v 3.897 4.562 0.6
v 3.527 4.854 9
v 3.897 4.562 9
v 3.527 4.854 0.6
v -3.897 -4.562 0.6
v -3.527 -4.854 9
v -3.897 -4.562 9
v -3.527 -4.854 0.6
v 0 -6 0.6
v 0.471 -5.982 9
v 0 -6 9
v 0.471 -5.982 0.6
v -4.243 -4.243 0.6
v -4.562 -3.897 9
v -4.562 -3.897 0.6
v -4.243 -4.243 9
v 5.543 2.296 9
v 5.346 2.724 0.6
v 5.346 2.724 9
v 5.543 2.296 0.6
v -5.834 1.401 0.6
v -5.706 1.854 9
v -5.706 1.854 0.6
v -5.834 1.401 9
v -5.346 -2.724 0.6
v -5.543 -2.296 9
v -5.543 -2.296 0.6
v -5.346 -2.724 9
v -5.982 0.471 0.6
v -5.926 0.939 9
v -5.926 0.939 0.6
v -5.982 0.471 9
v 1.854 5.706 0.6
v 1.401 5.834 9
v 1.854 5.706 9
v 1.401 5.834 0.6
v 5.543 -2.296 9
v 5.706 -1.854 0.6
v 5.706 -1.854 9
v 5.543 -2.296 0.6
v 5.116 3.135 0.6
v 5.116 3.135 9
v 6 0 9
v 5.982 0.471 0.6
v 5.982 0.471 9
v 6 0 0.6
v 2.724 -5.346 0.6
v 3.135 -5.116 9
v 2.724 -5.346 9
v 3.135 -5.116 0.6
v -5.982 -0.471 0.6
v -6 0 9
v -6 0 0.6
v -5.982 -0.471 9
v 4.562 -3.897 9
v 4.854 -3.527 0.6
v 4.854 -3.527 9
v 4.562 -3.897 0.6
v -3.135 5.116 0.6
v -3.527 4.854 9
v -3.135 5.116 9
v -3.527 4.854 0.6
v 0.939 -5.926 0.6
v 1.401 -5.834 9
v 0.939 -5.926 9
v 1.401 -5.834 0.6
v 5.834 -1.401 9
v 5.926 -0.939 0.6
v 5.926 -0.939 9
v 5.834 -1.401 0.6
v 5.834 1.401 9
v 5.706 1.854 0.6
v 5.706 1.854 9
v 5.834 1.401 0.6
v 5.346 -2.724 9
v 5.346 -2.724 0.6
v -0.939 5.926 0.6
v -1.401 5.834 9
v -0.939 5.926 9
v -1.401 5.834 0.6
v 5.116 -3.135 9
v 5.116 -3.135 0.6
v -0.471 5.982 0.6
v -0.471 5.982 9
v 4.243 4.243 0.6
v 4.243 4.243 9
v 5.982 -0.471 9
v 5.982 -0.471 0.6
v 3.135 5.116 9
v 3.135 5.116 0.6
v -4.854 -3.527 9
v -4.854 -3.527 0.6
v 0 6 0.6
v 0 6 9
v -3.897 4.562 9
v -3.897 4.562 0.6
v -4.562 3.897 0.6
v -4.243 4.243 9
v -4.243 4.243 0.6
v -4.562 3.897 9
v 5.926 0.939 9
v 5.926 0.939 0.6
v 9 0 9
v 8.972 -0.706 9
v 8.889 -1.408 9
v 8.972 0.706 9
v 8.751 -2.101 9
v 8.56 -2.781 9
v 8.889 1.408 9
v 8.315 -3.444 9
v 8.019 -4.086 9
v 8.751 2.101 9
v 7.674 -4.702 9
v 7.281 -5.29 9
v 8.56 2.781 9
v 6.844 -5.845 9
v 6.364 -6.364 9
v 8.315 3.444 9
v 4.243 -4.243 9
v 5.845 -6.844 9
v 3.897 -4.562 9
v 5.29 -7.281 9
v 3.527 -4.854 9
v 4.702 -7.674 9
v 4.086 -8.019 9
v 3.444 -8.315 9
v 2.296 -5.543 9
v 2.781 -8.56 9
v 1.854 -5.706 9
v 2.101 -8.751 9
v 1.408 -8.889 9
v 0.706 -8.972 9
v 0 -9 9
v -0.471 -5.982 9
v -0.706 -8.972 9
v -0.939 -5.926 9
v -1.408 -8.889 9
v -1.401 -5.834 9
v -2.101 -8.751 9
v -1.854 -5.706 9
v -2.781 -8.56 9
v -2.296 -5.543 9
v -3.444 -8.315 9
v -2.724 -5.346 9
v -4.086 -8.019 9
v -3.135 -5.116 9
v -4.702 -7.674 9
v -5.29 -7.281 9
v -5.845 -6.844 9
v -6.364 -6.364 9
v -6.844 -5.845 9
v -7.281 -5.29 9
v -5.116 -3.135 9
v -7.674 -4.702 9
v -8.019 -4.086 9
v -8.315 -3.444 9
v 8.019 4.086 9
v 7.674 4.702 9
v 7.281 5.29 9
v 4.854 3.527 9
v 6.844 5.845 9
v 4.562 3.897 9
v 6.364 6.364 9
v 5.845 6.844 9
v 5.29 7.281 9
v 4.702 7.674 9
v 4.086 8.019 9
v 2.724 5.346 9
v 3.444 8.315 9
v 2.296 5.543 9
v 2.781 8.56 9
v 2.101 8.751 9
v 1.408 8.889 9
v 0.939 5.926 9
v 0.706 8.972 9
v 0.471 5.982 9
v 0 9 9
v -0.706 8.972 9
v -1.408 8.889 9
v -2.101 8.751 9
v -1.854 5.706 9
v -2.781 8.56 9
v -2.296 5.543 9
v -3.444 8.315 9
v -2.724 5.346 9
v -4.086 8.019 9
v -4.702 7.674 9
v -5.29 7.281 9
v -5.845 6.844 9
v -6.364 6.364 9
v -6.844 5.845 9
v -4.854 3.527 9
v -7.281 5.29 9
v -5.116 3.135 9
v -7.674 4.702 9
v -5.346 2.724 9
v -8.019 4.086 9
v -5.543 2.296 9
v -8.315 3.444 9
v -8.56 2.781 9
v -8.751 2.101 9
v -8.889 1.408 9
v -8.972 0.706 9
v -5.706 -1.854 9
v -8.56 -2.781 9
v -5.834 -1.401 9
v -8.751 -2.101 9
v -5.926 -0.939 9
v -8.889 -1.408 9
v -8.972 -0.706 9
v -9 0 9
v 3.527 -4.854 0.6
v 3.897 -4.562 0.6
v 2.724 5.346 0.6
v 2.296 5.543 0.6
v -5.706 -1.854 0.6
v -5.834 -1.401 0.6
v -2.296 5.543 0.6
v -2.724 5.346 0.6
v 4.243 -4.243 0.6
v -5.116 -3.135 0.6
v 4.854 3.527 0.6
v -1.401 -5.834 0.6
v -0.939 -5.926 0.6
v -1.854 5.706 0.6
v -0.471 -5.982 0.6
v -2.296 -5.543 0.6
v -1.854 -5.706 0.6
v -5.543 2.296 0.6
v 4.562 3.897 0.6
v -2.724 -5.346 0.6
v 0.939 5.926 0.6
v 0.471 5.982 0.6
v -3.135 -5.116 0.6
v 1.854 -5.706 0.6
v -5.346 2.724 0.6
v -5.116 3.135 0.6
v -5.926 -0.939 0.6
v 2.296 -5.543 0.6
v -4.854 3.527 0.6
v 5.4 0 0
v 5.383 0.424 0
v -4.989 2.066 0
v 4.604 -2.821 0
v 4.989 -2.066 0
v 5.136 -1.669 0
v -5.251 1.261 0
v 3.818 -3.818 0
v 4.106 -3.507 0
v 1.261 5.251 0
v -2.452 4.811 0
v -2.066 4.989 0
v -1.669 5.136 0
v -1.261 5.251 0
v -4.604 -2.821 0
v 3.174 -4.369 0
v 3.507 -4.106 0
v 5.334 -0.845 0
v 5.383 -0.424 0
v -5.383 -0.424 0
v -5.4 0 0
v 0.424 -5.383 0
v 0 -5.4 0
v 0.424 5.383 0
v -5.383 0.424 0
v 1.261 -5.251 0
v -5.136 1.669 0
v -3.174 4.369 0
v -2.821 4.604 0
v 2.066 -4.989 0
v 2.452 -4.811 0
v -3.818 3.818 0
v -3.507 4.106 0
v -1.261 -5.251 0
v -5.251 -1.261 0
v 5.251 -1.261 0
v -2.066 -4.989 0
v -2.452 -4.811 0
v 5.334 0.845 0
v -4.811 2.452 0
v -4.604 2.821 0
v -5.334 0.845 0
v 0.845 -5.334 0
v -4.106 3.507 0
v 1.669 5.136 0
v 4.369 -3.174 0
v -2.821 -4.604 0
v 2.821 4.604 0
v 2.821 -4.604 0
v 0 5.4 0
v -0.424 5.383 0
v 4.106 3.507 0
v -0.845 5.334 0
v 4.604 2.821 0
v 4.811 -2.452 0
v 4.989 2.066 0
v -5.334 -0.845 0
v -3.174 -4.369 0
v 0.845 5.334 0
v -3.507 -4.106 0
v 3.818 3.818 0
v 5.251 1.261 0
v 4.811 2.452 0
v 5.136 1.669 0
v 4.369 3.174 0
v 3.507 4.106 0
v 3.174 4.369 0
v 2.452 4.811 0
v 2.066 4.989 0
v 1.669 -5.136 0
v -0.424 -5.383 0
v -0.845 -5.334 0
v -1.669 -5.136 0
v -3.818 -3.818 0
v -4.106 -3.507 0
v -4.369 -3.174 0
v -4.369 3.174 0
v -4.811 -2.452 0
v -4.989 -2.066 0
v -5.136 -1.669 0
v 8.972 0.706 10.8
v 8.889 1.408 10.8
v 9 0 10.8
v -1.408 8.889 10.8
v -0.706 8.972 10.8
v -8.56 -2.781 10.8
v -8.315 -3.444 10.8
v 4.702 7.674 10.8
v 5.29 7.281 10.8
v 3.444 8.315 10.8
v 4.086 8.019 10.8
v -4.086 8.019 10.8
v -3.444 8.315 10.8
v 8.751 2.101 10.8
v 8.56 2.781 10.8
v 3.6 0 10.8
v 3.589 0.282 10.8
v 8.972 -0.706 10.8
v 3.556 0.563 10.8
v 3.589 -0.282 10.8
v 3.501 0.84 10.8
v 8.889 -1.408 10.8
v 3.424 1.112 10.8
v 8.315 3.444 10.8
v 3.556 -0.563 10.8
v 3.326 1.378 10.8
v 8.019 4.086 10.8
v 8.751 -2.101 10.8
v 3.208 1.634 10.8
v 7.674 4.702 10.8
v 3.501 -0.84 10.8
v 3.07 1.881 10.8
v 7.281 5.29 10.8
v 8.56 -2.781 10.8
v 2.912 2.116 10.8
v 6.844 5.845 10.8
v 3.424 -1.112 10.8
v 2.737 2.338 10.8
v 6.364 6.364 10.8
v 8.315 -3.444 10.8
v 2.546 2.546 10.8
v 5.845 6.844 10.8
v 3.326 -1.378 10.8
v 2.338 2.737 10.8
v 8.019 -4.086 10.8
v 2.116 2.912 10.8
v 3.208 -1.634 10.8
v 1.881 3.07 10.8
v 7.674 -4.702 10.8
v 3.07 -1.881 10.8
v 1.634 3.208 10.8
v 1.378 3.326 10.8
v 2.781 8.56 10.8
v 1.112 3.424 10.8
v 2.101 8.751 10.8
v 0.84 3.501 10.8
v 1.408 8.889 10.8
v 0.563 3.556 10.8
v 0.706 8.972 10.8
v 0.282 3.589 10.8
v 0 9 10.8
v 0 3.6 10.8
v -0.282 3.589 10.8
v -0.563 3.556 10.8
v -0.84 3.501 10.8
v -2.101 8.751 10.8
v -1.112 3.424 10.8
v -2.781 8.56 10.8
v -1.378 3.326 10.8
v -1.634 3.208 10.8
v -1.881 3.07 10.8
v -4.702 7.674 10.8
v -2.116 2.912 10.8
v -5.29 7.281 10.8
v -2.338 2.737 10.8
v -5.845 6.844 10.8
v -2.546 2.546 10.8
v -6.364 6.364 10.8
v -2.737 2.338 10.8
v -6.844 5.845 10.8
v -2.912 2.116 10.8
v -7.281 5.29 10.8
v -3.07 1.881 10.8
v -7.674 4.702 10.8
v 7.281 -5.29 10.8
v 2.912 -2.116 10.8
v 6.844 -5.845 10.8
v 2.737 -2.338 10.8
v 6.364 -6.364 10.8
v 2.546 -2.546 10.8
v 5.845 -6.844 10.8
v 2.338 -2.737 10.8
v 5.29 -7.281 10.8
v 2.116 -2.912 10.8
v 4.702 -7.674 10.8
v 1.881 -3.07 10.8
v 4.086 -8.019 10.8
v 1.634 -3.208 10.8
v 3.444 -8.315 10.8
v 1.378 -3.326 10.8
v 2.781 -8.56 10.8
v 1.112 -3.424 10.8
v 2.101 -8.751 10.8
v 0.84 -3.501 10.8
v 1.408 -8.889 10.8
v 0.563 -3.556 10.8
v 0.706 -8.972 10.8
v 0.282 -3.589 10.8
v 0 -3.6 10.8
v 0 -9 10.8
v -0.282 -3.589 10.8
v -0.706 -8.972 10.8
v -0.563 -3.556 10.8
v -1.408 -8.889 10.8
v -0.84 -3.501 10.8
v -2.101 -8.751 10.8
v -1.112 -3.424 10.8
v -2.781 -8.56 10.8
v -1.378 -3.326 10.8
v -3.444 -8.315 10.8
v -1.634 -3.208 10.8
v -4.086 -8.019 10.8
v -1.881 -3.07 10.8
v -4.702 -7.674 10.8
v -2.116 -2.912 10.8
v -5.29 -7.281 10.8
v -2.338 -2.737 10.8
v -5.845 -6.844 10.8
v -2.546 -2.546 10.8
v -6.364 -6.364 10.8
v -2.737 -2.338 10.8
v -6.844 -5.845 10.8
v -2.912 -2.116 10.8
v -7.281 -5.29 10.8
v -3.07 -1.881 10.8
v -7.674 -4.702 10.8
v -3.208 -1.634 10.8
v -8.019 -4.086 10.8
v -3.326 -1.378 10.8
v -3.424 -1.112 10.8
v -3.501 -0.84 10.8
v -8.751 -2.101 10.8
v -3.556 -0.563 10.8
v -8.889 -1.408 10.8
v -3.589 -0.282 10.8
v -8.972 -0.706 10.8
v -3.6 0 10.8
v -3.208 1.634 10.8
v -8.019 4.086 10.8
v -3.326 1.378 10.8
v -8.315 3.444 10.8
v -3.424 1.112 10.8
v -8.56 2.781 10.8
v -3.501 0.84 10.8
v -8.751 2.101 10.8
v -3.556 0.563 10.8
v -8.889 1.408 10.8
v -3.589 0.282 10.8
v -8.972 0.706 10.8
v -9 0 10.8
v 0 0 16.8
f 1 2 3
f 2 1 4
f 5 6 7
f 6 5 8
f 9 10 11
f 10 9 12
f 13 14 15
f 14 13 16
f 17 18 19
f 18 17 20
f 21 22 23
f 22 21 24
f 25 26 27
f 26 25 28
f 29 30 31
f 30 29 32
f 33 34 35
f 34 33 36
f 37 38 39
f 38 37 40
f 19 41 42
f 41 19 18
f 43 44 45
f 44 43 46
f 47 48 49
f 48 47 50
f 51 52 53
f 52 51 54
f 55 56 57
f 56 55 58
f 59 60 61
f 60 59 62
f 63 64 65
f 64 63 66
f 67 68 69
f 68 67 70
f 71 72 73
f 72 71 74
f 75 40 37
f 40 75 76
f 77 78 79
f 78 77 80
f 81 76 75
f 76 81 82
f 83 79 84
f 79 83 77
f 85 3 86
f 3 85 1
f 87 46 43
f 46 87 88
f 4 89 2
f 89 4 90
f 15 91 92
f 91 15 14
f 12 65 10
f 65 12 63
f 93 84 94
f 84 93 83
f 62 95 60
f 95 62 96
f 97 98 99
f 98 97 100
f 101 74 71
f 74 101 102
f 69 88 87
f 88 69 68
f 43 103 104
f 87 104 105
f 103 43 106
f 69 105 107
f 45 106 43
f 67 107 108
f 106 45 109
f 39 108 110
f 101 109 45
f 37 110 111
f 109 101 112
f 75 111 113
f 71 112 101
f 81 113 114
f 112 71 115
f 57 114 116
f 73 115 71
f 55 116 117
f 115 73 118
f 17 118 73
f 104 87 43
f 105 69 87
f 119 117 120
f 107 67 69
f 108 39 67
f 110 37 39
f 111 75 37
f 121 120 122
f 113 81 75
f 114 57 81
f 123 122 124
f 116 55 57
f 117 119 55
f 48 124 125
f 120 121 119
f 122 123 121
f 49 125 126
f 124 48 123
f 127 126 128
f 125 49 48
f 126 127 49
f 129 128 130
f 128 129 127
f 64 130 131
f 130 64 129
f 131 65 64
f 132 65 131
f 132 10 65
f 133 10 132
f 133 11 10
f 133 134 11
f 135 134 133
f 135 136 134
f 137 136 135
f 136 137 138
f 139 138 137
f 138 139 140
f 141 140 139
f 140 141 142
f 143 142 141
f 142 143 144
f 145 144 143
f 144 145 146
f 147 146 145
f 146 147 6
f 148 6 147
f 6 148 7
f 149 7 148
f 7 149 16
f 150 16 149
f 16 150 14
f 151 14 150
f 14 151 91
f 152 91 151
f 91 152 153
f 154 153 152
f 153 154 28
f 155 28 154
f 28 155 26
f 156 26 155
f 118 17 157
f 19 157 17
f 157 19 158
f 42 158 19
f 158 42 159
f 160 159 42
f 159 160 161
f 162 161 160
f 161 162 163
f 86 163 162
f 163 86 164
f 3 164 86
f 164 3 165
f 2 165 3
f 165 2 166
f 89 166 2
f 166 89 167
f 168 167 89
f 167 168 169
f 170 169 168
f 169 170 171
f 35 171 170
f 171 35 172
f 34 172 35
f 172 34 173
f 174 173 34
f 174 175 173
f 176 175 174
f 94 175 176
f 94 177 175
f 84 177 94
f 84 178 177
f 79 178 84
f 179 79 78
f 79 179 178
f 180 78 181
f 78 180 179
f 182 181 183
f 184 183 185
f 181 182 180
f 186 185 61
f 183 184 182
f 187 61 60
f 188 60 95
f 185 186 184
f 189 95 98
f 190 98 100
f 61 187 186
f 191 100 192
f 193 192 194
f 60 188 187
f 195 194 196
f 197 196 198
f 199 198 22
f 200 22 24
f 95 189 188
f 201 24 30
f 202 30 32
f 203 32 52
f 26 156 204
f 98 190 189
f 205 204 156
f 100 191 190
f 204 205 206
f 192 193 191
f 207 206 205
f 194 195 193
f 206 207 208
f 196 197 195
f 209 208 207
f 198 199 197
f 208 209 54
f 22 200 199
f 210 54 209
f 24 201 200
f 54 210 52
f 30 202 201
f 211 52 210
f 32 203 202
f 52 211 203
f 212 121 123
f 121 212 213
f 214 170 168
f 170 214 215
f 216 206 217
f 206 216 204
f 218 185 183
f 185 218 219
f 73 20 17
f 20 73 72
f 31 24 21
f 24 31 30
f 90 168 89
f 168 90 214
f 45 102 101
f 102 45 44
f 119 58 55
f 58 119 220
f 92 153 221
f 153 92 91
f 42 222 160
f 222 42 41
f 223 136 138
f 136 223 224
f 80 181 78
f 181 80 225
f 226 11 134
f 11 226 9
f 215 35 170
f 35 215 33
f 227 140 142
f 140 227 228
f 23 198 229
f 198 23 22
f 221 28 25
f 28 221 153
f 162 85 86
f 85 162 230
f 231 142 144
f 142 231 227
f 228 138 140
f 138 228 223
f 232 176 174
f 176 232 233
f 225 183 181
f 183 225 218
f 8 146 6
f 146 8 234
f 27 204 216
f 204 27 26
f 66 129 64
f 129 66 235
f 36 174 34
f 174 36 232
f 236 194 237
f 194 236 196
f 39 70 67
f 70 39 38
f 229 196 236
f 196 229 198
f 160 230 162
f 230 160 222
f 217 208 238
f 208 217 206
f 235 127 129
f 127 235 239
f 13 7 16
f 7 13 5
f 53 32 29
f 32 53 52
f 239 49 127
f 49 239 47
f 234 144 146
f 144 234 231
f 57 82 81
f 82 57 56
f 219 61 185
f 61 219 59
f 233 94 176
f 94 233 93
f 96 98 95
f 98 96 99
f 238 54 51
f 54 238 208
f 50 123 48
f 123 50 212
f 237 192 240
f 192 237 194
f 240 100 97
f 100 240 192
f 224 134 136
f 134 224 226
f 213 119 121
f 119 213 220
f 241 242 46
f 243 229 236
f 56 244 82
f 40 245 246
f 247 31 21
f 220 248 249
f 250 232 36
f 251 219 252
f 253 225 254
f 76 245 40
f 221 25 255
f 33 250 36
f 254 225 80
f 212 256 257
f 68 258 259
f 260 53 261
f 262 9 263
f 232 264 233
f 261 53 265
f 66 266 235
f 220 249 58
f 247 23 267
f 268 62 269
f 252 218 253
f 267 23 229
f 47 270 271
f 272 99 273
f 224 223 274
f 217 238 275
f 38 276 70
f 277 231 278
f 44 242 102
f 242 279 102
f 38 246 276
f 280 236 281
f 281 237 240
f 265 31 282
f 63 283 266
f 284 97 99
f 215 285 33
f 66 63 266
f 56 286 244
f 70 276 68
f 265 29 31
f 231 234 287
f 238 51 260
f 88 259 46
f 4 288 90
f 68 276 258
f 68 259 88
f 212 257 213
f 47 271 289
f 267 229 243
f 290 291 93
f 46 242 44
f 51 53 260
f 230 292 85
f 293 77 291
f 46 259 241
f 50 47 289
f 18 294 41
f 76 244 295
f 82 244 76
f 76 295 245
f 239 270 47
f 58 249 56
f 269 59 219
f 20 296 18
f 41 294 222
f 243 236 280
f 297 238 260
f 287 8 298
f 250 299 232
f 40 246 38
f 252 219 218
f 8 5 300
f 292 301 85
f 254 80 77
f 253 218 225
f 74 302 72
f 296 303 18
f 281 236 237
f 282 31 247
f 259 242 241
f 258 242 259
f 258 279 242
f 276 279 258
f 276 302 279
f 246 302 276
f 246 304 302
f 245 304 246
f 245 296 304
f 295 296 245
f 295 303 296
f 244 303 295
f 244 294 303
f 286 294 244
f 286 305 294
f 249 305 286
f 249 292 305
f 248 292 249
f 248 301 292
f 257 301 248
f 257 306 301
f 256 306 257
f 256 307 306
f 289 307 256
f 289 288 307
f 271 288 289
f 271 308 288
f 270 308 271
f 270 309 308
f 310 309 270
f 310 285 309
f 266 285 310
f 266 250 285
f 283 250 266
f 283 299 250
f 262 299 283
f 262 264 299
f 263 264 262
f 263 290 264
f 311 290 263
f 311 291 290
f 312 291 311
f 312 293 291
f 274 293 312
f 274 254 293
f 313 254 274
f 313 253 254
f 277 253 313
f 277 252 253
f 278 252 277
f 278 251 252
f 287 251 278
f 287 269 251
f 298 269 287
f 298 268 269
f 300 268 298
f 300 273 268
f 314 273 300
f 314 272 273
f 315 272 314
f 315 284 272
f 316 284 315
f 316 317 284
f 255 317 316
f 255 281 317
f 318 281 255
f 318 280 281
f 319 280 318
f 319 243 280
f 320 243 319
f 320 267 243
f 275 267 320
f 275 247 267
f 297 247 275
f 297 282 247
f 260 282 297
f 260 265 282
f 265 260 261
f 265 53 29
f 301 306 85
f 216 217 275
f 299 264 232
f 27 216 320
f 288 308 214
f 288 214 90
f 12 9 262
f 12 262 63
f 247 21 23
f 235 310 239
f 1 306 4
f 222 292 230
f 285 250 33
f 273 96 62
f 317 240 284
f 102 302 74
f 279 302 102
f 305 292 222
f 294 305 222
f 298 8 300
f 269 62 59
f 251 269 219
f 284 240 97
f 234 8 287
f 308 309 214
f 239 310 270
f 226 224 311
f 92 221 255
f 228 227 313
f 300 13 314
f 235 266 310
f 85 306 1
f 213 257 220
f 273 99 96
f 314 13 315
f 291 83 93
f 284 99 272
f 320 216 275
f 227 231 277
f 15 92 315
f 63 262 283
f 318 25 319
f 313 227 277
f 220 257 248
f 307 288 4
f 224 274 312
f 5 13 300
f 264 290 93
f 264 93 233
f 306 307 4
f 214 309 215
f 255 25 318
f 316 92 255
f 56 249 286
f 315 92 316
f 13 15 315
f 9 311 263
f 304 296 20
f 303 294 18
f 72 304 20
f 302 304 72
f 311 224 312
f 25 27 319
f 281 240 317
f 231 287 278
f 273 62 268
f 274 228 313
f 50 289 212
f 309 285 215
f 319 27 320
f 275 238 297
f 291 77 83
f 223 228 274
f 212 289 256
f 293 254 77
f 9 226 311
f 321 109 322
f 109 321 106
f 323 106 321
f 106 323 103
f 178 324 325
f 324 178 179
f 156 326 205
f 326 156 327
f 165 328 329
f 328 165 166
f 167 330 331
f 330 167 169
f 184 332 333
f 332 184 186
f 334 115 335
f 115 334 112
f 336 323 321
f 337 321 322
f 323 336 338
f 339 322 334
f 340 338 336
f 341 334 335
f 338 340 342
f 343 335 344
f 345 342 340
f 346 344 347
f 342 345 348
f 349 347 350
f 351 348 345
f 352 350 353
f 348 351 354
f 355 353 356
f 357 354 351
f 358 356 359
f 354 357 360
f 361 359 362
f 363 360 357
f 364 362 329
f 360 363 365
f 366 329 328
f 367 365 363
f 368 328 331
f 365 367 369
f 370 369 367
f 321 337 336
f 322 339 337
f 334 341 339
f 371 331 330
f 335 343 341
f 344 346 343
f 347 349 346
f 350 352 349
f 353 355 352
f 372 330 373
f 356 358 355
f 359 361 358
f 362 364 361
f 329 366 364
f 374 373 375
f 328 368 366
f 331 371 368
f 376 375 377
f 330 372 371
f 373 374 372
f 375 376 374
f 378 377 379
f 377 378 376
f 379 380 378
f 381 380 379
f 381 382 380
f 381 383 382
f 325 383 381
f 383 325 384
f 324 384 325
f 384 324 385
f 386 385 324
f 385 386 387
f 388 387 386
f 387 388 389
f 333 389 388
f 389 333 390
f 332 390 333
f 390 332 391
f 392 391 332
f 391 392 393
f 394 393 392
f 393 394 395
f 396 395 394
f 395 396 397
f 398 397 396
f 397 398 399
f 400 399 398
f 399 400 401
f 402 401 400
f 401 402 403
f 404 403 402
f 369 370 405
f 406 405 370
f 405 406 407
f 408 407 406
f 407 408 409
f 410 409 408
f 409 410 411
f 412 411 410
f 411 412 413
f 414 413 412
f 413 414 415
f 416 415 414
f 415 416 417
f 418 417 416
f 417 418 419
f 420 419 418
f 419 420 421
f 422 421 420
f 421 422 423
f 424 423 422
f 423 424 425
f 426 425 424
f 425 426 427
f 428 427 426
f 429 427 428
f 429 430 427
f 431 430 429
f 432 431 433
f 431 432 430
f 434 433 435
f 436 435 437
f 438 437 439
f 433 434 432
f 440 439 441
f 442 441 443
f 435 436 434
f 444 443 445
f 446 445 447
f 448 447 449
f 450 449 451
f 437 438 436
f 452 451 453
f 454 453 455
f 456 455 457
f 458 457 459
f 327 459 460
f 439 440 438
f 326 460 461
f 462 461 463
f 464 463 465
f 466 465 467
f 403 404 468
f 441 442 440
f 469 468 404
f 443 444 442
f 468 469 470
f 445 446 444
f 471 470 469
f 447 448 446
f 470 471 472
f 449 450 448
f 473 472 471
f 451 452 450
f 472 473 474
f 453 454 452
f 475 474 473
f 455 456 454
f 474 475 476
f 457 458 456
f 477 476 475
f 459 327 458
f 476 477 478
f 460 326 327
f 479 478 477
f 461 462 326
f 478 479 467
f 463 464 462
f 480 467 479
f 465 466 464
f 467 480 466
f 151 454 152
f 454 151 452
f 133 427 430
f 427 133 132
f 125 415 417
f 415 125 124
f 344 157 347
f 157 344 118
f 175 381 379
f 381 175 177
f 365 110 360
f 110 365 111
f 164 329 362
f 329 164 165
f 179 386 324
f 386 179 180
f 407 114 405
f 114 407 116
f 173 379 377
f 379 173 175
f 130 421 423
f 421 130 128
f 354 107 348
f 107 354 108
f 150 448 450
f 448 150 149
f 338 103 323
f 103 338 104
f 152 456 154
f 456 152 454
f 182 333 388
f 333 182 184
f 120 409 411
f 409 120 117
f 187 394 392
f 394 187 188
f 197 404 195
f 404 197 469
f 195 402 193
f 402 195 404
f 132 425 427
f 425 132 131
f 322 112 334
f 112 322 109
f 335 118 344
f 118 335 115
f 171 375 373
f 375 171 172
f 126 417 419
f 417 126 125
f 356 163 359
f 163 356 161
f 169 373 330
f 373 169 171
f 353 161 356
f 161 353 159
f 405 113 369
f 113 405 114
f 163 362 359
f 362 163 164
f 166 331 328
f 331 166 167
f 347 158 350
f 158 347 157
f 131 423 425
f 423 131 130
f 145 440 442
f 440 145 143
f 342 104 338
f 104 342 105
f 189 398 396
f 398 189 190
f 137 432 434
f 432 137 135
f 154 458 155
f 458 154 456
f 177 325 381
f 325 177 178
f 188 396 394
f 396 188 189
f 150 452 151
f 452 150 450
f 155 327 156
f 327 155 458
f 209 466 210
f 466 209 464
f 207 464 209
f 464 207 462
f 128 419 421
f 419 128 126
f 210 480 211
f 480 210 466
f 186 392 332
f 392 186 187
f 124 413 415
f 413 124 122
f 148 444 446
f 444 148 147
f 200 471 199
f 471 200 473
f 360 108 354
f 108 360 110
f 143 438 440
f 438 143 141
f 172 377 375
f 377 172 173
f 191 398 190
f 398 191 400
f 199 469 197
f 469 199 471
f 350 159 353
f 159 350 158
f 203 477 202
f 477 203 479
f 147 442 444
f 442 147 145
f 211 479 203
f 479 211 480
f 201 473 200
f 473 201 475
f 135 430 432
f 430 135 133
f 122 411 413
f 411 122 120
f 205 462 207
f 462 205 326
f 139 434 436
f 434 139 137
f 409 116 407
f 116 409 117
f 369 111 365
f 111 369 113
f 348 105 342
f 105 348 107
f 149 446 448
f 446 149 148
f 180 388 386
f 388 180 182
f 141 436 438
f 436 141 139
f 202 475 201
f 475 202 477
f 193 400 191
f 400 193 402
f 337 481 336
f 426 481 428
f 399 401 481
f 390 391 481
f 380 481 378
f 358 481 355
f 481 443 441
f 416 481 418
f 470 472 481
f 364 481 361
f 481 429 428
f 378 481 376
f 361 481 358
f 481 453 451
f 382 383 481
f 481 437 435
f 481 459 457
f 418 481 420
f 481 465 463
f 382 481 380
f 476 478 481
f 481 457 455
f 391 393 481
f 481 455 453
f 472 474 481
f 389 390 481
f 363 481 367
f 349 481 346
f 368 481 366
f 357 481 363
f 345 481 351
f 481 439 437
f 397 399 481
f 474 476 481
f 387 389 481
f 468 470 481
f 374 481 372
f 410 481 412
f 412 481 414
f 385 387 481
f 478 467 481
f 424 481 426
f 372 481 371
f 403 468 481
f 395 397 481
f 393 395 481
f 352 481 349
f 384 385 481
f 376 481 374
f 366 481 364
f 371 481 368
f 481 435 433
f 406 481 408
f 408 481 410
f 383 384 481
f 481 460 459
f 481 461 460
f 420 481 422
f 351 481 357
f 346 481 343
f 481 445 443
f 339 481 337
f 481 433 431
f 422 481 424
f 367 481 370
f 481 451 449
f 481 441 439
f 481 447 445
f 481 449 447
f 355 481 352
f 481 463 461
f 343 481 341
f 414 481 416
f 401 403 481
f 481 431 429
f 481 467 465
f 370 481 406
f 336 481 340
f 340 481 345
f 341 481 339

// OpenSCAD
// ===========================================
// Parameterized Dowel Center
// ===========================================
// The cylinder diameter is the main parameter —
// set it to match your dowel hole size.

/* [Main Parameters] */
// Diameter of the cylinder that fits into the hole
cylinder_diameter = 12;    // [4:0.5:20]

/* [Proportional Overrides] */
// Set to 0 to use auto-calculated proportional values,
// or enter a positive number to override.

// Height of the cylinder body
cylinder_height_override = 0;   // [0:0.5:20]

// Outer diameter of the flange/rim
flange_diameter_override = 0;   // [0:0.5:30]

// Thickness of the flange
flange_thickness_override = 0;  // [0:0.25:5]

// Height of the conical point
point_height_override = 0;      // [0:0.5:15]

// Diameter of the point base
point_base_diameter_override = 0; // [0:0.5:15]

/* [Quality] */
$fn = 80;

// --- Derived dimensions (proportional to cylinder diameter) ---
cylinder_radius = cylinder_diameter / 2;

cylinder_height = (cylinder_height_override > 0)
    ? cylinder_height_override
    : cylinder_diameter * 0.75;

flange_diameter = (flange_diameter_override > 0)
    ? flange_diameter_override
    : cylinder_diameter * 1.5;

flange_thickness = (flange_thickness_override > 0)
    ? flange_thickness_override
    : cylinder_diameter * 0.15;

point_height = (point_height_override > 0)
    ? point_height_override
    : cylinder_diameter * 0.5;

point_base_diameter = (point_base_diameter_override > 0)
    ? point_base_diameter_override
    : cylinder_diameter * 0.6;

// --- Small chamfer on cylinder bottom edge ---
chamfer = cylinder_diameter * 0.05;

// --- Assembly ---
module dowel_center() {
    // Cylinder body
    union() {
        // Main cylinder with small bottom chamfer for easy insertion
        translate([0, 0, chamfer])
            cylinder(h = cylinder_height - chamfer, r = cylinder_radius);

        // Chamfered entry ring
        cylinder(h = chamfer, r1 = cylinder_radius - chamfer, r2 = cylinder_radius);
    }

    // Flange / rim sitting on top of the cylinder
    translate([0, 0, cylinder_height])
        cylinder(h = flange_thickness, r = flange_diameter / 2);

    // Conical point on top of the flange
    translate([0, 0, cylinder_height + flange_thickness])
        cylinder(h = point_height, r1 = point_base_diameter / 2, r2 = 0);
}

dowel_center();

// --- Info echo ---
echo(str("Cylinder: ø", cylinder_diameter, " × ", cylinder_height, "mm"));
echo(str("Flange:   ø", flange_diameter, " × ", flange_thickness, "mm"));
echo(str("Point:    ø", point_base_diameter, " base, ", point_height, "mm tall"));
